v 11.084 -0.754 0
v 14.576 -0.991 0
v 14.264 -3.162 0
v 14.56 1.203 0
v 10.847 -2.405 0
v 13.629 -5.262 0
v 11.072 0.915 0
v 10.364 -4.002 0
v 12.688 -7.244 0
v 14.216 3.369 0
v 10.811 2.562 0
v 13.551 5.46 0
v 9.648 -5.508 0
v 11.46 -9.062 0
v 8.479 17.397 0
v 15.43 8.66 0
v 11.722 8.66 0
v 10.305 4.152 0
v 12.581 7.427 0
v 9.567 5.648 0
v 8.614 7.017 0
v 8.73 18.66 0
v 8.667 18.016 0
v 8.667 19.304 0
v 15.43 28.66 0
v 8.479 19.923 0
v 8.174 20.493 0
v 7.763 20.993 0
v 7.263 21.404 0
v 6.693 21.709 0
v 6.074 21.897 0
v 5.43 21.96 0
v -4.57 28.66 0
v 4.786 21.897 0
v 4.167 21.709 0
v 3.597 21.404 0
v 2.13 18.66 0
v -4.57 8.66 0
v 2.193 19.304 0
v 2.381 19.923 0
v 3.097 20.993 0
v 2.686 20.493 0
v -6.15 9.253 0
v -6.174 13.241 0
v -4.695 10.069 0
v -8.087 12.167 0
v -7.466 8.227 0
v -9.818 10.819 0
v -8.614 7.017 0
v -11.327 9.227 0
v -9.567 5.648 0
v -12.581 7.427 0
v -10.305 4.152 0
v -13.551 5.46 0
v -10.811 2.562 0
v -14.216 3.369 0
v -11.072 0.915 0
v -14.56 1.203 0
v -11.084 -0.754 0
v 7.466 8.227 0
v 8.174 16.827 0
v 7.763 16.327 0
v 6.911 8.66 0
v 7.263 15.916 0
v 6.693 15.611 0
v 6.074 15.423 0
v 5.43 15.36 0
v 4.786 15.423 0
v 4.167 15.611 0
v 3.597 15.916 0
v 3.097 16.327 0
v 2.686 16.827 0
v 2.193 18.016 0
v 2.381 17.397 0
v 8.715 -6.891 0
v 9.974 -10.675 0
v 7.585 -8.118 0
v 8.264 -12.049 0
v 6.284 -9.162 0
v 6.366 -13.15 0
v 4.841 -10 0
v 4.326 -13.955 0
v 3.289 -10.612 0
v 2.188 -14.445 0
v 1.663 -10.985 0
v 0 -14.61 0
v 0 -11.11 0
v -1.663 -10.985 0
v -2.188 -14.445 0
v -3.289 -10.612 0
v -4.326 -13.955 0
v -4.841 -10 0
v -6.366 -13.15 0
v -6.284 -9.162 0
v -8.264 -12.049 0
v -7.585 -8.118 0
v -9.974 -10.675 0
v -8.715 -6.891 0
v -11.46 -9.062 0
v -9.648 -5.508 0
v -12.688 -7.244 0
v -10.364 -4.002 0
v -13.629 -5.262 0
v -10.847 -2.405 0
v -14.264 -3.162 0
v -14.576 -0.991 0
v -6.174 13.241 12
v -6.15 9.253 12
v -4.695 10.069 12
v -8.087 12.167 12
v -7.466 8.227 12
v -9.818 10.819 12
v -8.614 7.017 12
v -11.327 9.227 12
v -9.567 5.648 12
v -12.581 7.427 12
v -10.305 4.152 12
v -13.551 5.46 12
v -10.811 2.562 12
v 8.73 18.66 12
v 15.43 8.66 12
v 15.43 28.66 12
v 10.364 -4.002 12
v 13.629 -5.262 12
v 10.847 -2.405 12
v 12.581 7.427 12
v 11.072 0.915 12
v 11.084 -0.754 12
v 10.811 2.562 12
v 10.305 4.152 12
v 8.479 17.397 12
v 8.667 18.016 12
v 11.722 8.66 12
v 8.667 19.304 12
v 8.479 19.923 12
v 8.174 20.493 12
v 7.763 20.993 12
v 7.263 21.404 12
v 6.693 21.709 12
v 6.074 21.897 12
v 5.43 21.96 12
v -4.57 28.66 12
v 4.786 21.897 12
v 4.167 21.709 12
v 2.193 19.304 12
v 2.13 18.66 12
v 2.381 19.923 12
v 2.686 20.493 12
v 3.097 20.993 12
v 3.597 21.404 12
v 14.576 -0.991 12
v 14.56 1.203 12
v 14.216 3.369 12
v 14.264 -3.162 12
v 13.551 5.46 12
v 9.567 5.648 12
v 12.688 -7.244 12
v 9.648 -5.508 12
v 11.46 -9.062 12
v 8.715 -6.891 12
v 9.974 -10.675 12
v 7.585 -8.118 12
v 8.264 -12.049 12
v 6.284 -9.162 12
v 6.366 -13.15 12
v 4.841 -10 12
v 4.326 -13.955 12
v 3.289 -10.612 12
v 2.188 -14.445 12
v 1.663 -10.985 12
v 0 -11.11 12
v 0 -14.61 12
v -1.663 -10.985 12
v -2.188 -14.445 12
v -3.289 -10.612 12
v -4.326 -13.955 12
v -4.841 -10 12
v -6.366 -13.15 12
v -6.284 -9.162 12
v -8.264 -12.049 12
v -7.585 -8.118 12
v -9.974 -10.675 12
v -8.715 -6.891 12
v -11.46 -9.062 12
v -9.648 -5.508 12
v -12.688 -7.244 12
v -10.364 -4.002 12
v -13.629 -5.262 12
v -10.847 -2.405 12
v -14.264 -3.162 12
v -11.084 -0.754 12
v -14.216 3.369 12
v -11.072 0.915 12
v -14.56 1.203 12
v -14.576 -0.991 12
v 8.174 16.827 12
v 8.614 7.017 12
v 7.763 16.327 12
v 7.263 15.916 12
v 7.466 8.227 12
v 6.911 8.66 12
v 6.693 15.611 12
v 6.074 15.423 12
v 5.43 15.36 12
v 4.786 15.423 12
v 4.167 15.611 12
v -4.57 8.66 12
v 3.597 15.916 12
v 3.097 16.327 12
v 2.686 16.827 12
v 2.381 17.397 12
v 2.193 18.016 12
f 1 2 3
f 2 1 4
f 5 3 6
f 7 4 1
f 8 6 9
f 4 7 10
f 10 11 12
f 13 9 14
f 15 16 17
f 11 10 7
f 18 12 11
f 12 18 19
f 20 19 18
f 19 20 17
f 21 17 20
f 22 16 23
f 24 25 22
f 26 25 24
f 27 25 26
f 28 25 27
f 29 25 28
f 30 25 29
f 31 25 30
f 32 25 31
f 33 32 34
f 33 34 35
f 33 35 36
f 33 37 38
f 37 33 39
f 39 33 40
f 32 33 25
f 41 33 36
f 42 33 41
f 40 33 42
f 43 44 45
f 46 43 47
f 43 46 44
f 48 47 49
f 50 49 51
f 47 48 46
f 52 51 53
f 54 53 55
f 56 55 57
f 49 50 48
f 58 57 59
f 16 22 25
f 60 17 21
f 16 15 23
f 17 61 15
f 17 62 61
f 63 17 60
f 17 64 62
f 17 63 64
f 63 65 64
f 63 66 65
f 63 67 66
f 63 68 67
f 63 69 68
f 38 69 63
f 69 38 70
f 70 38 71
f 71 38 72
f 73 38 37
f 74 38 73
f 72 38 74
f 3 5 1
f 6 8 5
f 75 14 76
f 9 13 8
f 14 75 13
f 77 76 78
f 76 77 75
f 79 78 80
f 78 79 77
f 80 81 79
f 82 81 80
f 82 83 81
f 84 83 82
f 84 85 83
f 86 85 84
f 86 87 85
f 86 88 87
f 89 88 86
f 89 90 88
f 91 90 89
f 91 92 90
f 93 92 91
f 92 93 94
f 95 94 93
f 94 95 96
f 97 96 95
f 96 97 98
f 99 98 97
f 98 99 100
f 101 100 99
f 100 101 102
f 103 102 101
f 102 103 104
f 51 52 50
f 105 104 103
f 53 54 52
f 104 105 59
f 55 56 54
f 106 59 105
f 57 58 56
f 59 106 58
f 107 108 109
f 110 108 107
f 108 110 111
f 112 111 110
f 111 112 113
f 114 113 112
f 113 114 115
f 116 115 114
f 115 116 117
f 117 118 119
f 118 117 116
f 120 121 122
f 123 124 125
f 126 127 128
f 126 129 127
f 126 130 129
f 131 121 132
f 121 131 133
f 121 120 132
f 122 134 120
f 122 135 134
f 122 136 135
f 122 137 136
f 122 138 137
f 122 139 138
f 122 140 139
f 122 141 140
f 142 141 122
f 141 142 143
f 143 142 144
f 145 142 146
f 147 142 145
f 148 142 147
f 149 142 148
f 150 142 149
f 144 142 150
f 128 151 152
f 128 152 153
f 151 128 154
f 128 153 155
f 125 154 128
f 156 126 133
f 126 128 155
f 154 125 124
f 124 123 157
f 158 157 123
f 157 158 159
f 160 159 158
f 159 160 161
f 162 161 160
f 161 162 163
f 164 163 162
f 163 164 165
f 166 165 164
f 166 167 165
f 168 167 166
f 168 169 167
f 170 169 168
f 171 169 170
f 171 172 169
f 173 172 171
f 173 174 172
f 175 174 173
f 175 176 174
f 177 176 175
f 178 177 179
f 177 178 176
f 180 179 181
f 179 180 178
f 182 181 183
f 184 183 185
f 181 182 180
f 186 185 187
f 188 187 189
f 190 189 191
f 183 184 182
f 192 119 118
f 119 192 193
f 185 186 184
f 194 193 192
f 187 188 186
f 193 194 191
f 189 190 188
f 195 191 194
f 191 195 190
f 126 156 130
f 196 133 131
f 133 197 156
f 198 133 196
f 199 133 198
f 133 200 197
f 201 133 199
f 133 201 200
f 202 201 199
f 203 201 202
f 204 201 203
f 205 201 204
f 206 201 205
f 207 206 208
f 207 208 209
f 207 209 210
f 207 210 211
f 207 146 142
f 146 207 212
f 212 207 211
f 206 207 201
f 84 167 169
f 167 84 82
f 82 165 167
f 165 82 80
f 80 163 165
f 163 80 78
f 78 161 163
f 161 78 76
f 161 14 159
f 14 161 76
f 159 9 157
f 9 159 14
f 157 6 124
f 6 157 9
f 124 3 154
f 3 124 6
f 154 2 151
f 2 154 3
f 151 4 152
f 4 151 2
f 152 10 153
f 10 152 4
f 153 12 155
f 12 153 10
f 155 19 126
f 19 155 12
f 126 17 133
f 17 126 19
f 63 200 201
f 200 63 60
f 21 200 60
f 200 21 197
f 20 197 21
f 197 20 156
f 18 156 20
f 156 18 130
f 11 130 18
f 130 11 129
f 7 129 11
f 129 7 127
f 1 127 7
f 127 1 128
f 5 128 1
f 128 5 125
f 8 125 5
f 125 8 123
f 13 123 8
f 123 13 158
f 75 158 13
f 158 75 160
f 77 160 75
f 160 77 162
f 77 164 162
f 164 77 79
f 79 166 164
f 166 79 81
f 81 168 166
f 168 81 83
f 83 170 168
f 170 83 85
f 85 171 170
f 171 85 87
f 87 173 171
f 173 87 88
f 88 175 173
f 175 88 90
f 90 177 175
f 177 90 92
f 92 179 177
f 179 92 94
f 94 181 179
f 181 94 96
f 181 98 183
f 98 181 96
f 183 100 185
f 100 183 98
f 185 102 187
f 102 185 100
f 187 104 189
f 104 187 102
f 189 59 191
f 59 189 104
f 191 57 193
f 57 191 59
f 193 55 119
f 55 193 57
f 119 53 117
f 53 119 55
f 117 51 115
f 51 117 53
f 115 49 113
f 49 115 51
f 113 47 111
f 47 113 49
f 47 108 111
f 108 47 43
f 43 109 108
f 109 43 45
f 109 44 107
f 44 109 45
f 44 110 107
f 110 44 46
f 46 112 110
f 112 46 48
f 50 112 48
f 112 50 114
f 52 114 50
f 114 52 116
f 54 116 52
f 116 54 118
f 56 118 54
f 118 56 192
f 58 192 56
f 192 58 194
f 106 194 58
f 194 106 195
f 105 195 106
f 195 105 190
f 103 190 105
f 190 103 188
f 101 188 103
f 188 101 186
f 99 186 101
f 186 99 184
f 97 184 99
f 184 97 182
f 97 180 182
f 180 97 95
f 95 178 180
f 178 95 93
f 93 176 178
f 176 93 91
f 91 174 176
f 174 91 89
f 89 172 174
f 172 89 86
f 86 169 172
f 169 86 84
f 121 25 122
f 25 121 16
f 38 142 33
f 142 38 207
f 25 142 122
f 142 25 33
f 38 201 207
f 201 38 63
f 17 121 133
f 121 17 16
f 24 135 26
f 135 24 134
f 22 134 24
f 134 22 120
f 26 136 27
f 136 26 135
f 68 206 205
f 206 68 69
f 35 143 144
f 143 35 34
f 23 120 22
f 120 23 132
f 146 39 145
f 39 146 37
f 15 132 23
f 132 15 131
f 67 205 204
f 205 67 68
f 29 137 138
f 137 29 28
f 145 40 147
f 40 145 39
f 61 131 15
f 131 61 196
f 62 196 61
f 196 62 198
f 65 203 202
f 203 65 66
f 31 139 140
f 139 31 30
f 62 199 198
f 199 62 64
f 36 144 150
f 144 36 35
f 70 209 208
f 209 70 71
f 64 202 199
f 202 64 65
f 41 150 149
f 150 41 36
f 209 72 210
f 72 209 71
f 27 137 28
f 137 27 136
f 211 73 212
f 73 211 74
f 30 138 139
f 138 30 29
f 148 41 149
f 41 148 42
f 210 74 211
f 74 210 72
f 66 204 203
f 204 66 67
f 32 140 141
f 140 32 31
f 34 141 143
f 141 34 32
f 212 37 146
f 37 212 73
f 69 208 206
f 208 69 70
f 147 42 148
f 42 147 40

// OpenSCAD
$fn = 32;

// ----------------------------------------------------------------------
// Pipe clamp: 29.22 mm ring, 3.5 mm wall, 12 mm wide
// ----------------------------------------------------------------------

// --- parameters (mm) ---
outer_r = 14.61;          // clamp outside radius
inner_r = 11.11;          // pipe bore radius
band = 3.5;               // band thickness
clamp_w = 12;             // clamp width
opening = 50;             // opening angle between the ends
lug_w = 20;               // lug width
lug_len = 20;             // lug length
bolt_d = 6.6;             // bolt hole

clamp_profile = [[-6.174, 13.241], [-8.087, 12.167], [-9.818, 10.819], [-11.327, 9.227], [-12.581, 7.427], [-13.551, 5.46], [-14.216, 3.369], [-14.56, 1.203], [-14.576, -0.991], [-14.264, -3.162], [-13.629, -5.262], [-12.688, -7.244], [-11.46, -9.062], [-9.974, -10.675], [-8.264, -12.049], [-6.366, -13.15], [-4.326, -13.955], [-2.188, -14.445], [0, -14.61], [2.188, -14.445], [4.326, -13.955], [6.366, -13.15], [8.264, -12.049], [9.974, -10.675], [11.46, -9.062], [12.688, -7.244], [13.629, -5.262], [14.264, -3.162], [14.576, -0.991], [14.56, 1.203], [14.216, 3.369], [13.551, 5.46], [12.581, 7.427], [11.327, 9.227], [9.818, 10.819], [8.087, 12.167], [6.174, 13.241], [4.695, 10.069], [6.15, 9.253], [7.466, 8.227], [8.614, 7.017], [9.567, 5.648], [10.305, 4.152], [10.811, 2.562], [11.072, 0.915], [11.084, -0.754], [10.847, -2.405], [10.364, -4.002], [9.648, -5.508], [8.715, -6.891], [7.585, -8.118], [6.284, -9.162], [4.841, -10], [3.289, -10.612], [1.663, -10.985], [0, -11.11], [-1.663, -10.985], [-3.289, -10.612], [-4.841, -10], [-6.284, -9.162], [-7.585, -8.118], [-8.715, -6.891], [-9.648, -5.508], [-10.364, -4.002], [-10.847, -2.405], [-11.084, -0.754], [-11.072, 0.915], [-10.811, 2.562], [-10.305, 4.152], [-9.567, 5.648], [-8.614, 7.017], [-7.466, 8.227], [-6.15, 9.253], [-4.695, 10.069]];

difference() {
  union() {
    linear_extrude(height = clamp_w) polygon(clamp_profile);
    /* bolt lug on the other end */
    translate([-4.57, 8.66, 0]) cube([lug_w, 20, clamp_w]);
  }
  translate([5.43, 18.66, -2.5]) cylinder(h = clamp_w + 5, d = bolt_d);
}
